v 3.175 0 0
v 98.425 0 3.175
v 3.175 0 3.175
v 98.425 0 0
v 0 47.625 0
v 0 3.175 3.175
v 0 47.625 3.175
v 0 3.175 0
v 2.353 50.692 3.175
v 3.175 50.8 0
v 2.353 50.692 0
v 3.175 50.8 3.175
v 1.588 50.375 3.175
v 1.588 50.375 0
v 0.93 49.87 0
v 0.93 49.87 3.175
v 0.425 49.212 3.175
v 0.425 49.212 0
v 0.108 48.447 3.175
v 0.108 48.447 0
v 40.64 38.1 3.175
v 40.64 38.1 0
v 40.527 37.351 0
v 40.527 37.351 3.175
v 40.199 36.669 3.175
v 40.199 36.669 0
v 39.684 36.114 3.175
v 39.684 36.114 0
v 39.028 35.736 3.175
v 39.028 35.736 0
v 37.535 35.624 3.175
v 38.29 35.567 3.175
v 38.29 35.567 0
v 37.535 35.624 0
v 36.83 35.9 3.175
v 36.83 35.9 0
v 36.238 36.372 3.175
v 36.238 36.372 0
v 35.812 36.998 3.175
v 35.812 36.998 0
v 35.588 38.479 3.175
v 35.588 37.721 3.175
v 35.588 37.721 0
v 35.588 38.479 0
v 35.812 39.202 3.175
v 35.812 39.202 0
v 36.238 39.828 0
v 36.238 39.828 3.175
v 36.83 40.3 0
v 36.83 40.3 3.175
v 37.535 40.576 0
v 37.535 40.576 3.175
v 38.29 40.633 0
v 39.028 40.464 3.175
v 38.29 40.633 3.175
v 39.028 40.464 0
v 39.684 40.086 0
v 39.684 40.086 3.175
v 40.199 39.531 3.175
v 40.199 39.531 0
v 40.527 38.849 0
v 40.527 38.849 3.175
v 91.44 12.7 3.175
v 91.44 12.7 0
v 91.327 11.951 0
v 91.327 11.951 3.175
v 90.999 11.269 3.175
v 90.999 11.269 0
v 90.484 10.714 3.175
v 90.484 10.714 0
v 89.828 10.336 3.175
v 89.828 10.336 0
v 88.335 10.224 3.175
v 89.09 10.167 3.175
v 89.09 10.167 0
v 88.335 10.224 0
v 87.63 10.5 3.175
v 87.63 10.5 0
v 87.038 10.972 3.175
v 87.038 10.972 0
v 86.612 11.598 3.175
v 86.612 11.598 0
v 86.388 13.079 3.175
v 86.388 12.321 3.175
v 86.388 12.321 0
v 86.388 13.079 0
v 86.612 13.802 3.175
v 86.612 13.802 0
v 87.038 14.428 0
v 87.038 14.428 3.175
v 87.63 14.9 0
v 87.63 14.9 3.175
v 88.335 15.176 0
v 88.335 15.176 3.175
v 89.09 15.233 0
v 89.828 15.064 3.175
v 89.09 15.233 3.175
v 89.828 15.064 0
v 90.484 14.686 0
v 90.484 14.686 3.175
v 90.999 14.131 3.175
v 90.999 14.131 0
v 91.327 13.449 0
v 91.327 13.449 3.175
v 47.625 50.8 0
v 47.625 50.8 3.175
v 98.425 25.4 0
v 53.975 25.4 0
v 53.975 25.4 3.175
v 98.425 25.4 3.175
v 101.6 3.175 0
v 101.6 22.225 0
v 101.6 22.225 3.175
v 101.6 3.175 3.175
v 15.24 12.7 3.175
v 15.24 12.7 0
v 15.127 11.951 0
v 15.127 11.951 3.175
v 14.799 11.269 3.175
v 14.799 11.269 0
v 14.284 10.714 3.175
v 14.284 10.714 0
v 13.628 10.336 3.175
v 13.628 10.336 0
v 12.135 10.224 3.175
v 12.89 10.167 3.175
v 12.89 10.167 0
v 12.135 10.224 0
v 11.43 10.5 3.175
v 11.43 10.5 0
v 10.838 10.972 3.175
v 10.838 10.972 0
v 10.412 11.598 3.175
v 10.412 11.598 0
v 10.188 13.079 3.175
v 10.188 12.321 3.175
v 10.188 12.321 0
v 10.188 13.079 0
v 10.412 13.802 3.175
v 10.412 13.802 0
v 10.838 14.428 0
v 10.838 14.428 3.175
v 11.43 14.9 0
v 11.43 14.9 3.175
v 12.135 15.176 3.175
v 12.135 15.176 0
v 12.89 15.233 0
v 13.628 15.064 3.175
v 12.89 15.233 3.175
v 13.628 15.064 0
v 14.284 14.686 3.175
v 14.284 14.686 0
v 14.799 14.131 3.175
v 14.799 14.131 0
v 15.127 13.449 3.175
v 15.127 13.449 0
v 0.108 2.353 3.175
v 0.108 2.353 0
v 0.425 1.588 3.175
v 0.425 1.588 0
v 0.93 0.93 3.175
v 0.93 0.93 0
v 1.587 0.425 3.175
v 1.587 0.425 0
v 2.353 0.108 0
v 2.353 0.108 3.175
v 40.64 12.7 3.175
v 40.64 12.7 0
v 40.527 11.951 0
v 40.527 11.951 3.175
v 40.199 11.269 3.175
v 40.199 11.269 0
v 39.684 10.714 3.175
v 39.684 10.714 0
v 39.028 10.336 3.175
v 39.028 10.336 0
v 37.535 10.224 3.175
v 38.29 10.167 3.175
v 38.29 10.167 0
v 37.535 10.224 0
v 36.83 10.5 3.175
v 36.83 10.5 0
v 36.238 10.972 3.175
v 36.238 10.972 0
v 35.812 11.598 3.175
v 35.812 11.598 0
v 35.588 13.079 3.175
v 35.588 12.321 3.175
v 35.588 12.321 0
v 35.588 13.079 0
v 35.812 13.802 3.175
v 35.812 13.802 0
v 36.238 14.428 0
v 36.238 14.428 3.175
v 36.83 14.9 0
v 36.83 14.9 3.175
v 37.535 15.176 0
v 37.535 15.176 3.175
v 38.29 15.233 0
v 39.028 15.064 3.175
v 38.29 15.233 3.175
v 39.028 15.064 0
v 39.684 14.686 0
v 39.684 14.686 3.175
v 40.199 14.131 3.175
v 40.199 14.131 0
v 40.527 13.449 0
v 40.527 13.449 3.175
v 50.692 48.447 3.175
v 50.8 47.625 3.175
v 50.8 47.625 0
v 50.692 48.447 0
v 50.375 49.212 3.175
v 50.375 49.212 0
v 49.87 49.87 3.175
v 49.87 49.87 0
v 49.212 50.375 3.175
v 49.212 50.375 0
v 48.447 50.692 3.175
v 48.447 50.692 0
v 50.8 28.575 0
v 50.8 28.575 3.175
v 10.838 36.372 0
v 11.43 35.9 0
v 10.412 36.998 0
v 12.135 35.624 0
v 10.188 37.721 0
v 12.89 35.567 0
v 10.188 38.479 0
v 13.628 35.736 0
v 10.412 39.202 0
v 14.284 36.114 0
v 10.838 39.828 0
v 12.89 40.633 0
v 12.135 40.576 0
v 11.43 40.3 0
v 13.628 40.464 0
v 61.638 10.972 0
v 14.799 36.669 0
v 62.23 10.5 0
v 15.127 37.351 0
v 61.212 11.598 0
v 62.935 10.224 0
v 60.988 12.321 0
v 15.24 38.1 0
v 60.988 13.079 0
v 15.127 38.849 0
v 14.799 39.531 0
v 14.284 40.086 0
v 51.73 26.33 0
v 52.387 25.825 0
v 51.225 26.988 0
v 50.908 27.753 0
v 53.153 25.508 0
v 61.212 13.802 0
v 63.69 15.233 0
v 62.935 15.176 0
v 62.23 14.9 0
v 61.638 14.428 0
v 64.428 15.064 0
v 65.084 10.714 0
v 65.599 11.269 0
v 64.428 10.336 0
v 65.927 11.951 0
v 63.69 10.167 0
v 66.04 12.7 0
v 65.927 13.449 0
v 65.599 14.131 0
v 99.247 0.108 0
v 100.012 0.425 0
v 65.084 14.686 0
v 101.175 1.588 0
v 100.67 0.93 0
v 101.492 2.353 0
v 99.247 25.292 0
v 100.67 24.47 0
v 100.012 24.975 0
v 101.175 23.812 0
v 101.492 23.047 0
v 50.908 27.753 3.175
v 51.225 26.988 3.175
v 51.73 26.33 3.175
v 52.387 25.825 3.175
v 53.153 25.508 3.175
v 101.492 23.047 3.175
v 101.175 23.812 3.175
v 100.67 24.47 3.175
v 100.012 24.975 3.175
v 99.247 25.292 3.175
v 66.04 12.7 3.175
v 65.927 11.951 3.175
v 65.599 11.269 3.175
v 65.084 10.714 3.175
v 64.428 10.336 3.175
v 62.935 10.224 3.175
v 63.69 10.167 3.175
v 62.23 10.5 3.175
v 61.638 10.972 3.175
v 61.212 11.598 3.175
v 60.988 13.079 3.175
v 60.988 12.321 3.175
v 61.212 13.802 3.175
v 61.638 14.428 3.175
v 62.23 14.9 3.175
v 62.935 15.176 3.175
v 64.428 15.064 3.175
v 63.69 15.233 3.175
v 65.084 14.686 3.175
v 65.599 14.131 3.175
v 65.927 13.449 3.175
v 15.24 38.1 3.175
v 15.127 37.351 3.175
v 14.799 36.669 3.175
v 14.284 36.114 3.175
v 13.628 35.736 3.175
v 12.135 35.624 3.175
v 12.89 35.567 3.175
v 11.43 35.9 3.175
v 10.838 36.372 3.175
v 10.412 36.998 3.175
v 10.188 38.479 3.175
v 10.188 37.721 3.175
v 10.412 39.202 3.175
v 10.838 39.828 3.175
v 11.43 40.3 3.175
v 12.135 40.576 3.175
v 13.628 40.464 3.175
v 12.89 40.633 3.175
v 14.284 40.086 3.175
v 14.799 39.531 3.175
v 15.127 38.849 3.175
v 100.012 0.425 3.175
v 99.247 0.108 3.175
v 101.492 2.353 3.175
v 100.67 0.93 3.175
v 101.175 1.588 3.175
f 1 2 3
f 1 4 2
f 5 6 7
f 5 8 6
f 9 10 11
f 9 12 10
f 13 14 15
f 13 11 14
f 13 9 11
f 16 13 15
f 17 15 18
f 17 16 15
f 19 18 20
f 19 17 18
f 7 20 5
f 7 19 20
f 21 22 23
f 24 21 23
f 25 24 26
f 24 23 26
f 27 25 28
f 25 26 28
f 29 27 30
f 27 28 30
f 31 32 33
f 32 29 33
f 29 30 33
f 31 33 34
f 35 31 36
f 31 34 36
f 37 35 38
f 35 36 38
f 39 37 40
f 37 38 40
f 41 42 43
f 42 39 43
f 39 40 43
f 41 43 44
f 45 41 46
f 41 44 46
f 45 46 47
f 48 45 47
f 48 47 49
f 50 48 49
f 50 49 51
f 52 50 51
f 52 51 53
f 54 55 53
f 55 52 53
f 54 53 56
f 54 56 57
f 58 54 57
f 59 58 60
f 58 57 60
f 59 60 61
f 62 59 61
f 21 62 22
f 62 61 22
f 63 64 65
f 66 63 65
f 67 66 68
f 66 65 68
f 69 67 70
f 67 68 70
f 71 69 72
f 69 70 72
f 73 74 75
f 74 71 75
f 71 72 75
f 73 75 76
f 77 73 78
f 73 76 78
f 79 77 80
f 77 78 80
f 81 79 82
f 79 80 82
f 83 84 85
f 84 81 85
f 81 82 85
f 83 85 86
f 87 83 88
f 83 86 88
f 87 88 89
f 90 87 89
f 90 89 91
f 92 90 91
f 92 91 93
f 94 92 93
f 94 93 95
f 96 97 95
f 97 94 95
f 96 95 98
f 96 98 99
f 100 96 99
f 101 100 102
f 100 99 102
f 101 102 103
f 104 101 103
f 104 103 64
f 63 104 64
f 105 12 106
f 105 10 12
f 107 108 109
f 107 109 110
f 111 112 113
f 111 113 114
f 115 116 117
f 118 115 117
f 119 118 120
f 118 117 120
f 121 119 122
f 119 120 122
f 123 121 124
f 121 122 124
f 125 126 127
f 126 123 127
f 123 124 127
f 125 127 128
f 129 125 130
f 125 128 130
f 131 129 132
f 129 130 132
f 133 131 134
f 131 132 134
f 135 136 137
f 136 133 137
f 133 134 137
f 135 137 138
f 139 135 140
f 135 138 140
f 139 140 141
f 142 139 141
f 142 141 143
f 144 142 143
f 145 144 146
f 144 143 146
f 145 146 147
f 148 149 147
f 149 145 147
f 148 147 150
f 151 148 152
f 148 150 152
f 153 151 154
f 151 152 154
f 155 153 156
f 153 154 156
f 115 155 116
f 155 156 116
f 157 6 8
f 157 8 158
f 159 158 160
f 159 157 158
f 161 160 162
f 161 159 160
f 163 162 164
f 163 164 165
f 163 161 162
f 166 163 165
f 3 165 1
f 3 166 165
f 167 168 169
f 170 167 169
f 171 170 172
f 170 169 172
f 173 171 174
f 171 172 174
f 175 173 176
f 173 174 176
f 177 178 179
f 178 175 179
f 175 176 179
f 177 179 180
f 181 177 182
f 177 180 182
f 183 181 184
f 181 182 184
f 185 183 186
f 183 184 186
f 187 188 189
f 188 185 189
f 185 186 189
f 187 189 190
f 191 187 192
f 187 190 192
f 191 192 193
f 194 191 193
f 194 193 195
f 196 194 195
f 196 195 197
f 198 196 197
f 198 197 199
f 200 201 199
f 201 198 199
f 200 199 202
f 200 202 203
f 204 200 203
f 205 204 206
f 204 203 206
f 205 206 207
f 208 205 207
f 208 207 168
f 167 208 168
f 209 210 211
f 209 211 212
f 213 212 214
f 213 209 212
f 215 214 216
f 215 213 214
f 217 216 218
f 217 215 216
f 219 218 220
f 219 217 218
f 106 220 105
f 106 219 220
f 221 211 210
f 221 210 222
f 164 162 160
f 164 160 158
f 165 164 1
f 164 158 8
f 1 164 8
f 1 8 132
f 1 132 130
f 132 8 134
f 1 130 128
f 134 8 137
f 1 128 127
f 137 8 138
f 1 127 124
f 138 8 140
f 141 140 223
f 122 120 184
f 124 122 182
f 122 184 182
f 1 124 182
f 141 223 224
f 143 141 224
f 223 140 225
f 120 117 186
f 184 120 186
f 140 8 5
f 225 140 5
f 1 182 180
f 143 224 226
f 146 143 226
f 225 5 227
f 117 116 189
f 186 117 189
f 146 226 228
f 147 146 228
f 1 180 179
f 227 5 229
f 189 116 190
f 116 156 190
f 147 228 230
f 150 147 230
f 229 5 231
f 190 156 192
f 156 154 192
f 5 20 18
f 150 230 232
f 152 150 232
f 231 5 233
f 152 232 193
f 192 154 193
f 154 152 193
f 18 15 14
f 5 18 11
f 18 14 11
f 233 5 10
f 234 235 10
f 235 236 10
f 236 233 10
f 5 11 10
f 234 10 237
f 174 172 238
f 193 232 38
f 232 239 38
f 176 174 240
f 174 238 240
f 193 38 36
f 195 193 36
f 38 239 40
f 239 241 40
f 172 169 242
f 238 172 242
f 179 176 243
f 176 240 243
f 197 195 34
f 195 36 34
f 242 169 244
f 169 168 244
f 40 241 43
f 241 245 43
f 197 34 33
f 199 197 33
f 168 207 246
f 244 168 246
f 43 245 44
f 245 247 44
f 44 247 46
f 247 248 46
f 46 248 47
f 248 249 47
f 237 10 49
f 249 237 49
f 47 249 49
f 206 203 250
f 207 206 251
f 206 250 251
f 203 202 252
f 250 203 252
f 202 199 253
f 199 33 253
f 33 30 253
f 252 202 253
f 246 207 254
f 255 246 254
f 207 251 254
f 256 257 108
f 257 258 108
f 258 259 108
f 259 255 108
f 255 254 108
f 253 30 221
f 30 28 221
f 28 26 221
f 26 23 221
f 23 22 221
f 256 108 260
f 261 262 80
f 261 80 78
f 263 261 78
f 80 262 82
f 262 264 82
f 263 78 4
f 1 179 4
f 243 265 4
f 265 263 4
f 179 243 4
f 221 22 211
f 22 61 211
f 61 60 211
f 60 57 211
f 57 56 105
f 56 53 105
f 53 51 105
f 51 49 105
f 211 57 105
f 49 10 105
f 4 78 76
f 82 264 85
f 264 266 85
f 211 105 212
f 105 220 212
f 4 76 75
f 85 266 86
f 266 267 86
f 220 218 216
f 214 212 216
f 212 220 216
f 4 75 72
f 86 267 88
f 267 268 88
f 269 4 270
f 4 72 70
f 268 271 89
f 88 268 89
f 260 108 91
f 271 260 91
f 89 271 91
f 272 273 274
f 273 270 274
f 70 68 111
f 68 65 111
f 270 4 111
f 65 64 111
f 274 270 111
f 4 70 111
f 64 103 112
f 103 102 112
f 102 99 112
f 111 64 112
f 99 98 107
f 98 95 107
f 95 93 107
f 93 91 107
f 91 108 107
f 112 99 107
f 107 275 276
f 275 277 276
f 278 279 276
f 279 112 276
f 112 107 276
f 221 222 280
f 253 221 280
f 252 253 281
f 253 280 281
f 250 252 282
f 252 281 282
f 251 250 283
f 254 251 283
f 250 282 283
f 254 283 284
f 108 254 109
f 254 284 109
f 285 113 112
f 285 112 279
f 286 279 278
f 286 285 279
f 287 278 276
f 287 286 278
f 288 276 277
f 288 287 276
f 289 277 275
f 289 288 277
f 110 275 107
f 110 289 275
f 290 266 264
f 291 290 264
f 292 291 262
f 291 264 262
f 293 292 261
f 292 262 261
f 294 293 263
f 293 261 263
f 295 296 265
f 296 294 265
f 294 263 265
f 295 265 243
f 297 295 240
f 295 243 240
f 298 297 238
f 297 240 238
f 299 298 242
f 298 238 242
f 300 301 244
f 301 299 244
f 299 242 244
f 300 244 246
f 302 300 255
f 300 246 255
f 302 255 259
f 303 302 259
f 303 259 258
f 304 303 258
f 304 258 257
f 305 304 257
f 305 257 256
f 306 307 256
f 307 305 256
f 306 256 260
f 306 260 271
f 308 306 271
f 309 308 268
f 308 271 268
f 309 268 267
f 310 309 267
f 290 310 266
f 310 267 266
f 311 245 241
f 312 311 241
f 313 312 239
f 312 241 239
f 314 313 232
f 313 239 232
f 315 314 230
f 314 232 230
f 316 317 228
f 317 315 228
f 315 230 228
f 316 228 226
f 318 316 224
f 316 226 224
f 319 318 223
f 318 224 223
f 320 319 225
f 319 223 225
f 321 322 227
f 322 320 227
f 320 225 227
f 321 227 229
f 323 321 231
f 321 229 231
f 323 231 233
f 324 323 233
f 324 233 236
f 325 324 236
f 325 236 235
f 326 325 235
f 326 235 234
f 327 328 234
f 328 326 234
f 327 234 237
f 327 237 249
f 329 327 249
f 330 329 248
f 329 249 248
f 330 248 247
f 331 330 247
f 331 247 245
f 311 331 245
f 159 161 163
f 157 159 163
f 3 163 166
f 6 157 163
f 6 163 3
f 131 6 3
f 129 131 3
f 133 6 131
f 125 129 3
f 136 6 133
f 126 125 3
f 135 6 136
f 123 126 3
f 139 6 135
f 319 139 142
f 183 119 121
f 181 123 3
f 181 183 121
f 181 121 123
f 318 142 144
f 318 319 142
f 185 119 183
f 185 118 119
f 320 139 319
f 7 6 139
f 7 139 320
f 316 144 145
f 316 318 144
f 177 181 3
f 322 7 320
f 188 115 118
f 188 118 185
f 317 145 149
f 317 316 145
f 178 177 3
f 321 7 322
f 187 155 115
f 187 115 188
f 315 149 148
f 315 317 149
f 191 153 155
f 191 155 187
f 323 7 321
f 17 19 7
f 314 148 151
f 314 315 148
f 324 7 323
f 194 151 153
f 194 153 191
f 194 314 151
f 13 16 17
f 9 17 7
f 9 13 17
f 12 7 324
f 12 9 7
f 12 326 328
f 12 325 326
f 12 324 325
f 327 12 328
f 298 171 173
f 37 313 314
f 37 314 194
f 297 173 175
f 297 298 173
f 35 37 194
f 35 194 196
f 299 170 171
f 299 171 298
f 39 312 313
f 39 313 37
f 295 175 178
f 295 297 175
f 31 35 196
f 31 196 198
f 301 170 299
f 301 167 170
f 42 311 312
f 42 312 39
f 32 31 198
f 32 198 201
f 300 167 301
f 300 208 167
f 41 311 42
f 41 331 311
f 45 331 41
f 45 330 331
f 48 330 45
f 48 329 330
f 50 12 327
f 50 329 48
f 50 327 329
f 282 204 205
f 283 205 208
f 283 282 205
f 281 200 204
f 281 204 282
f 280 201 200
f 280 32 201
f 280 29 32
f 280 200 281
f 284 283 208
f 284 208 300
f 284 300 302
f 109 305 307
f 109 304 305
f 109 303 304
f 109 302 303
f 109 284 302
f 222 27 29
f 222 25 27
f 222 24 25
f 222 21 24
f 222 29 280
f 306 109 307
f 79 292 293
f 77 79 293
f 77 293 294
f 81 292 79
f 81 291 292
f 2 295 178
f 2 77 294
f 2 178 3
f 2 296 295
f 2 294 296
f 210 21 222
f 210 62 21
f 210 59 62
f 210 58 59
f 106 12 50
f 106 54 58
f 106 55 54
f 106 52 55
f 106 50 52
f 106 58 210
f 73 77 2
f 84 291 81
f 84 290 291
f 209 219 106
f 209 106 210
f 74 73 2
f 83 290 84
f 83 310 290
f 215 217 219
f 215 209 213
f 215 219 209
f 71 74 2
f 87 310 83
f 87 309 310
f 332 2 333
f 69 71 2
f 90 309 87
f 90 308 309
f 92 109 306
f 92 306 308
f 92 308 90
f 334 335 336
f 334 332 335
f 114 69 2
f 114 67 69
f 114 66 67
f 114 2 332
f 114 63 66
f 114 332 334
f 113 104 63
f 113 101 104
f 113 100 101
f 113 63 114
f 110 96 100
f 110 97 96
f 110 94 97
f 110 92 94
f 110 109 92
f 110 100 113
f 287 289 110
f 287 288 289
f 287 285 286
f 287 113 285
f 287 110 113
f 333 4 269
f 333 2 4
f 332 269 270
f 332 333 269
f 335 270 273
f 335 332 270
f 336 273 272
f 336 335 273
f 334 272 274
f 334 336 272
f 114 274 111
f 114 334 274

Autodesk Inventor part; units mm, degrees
ref_plane "YZ Plane" through (0, 0, 0) normal (1, 0, 0) x (0, 1, 0)
ref_plane "XZ Plane" through (0, 0, 0) normal (0, 1, 0) x (-1, 0, 0)
ref_plane "XY Plane" through (0, 0, 0) normal (0, 0, 1) x (1, 0, 0)
sketch "Sketch1" plane through (0, 0, 0) normal (0, 0, 1) x (1, 0, 0)
  line L0 (0, 0) -> (0, 50.8)
  line L1 (0, 50.8) -> (50.8, 50.8)
  line L2 (50.8, 50.8) -> (50.8, 25.4)
  line L3 (50.8, 25.4) -> (101.6, 25.4)
  line L4 (101.6, 25.4) -> (101.6, 0)
  line L5 (101.6, 0) -> (0, 0)
  line L6 (0, 50.8) -> (12.7, 50.8) construction
  line L7 (12.7, 50.8) -> (12.7, 38.1) construction
  line L8 (12.7, 38.1) -> (38.1, 38.1) construction
  line L9 (38.1, 38.1) -> (38.1, 12.7) construction
  line L10 (38.1, 12.7) -> (12.7, 12.7) construction
  line L11 (12.7, 12.7) -> (63.5, 12.7) construction
  line L12 (63.5, 12.7) -> (88.9, 12.7) construction
  circle A0 centre (12.7, 38.1) radius 2.54
  circle A1 centre (38.1, 38.1) radius 2.54
  circle A2 centre (38.1, 12.7) radius 2.54
  circle A3 centre (12.7, 12.7) radius 2.54
  circle A4 centre (63.5, 12.7) radius 2.54
  circle A5 centre (88.9, 12.7) radius 2.54
  dimension "d0" = 50.8
  dimension "d1" = 50.8
  dimension "d2" = 25.4
  dimension "d3" = 50.8
  dimension "d4" = 12.7
  dimension "d5" = 12.7
  dimension "d6" = 25.4
  dimension "d8" = 25.4
  dimension "d9" = 25.4
  dimension "d10" = 50.8
  dimension "d11" = 25.4
  dimension "d12" = 5.08
extrude "Extrusion1" add sketch "Sketch1" along normal blind 3.175
fillet "Fillet1" radius 3.175 6 edges at (50.8, 50.8, 1.5875) (50.8, 25.4, 1.5875) (0, 50.8, 1.5875) (0, 0, 1.5875) (101.6, 0, 1.5875) (101.6, 25.4, 1.5875)
properties part number "Sax Gusset" material "Aluminum 6061"
